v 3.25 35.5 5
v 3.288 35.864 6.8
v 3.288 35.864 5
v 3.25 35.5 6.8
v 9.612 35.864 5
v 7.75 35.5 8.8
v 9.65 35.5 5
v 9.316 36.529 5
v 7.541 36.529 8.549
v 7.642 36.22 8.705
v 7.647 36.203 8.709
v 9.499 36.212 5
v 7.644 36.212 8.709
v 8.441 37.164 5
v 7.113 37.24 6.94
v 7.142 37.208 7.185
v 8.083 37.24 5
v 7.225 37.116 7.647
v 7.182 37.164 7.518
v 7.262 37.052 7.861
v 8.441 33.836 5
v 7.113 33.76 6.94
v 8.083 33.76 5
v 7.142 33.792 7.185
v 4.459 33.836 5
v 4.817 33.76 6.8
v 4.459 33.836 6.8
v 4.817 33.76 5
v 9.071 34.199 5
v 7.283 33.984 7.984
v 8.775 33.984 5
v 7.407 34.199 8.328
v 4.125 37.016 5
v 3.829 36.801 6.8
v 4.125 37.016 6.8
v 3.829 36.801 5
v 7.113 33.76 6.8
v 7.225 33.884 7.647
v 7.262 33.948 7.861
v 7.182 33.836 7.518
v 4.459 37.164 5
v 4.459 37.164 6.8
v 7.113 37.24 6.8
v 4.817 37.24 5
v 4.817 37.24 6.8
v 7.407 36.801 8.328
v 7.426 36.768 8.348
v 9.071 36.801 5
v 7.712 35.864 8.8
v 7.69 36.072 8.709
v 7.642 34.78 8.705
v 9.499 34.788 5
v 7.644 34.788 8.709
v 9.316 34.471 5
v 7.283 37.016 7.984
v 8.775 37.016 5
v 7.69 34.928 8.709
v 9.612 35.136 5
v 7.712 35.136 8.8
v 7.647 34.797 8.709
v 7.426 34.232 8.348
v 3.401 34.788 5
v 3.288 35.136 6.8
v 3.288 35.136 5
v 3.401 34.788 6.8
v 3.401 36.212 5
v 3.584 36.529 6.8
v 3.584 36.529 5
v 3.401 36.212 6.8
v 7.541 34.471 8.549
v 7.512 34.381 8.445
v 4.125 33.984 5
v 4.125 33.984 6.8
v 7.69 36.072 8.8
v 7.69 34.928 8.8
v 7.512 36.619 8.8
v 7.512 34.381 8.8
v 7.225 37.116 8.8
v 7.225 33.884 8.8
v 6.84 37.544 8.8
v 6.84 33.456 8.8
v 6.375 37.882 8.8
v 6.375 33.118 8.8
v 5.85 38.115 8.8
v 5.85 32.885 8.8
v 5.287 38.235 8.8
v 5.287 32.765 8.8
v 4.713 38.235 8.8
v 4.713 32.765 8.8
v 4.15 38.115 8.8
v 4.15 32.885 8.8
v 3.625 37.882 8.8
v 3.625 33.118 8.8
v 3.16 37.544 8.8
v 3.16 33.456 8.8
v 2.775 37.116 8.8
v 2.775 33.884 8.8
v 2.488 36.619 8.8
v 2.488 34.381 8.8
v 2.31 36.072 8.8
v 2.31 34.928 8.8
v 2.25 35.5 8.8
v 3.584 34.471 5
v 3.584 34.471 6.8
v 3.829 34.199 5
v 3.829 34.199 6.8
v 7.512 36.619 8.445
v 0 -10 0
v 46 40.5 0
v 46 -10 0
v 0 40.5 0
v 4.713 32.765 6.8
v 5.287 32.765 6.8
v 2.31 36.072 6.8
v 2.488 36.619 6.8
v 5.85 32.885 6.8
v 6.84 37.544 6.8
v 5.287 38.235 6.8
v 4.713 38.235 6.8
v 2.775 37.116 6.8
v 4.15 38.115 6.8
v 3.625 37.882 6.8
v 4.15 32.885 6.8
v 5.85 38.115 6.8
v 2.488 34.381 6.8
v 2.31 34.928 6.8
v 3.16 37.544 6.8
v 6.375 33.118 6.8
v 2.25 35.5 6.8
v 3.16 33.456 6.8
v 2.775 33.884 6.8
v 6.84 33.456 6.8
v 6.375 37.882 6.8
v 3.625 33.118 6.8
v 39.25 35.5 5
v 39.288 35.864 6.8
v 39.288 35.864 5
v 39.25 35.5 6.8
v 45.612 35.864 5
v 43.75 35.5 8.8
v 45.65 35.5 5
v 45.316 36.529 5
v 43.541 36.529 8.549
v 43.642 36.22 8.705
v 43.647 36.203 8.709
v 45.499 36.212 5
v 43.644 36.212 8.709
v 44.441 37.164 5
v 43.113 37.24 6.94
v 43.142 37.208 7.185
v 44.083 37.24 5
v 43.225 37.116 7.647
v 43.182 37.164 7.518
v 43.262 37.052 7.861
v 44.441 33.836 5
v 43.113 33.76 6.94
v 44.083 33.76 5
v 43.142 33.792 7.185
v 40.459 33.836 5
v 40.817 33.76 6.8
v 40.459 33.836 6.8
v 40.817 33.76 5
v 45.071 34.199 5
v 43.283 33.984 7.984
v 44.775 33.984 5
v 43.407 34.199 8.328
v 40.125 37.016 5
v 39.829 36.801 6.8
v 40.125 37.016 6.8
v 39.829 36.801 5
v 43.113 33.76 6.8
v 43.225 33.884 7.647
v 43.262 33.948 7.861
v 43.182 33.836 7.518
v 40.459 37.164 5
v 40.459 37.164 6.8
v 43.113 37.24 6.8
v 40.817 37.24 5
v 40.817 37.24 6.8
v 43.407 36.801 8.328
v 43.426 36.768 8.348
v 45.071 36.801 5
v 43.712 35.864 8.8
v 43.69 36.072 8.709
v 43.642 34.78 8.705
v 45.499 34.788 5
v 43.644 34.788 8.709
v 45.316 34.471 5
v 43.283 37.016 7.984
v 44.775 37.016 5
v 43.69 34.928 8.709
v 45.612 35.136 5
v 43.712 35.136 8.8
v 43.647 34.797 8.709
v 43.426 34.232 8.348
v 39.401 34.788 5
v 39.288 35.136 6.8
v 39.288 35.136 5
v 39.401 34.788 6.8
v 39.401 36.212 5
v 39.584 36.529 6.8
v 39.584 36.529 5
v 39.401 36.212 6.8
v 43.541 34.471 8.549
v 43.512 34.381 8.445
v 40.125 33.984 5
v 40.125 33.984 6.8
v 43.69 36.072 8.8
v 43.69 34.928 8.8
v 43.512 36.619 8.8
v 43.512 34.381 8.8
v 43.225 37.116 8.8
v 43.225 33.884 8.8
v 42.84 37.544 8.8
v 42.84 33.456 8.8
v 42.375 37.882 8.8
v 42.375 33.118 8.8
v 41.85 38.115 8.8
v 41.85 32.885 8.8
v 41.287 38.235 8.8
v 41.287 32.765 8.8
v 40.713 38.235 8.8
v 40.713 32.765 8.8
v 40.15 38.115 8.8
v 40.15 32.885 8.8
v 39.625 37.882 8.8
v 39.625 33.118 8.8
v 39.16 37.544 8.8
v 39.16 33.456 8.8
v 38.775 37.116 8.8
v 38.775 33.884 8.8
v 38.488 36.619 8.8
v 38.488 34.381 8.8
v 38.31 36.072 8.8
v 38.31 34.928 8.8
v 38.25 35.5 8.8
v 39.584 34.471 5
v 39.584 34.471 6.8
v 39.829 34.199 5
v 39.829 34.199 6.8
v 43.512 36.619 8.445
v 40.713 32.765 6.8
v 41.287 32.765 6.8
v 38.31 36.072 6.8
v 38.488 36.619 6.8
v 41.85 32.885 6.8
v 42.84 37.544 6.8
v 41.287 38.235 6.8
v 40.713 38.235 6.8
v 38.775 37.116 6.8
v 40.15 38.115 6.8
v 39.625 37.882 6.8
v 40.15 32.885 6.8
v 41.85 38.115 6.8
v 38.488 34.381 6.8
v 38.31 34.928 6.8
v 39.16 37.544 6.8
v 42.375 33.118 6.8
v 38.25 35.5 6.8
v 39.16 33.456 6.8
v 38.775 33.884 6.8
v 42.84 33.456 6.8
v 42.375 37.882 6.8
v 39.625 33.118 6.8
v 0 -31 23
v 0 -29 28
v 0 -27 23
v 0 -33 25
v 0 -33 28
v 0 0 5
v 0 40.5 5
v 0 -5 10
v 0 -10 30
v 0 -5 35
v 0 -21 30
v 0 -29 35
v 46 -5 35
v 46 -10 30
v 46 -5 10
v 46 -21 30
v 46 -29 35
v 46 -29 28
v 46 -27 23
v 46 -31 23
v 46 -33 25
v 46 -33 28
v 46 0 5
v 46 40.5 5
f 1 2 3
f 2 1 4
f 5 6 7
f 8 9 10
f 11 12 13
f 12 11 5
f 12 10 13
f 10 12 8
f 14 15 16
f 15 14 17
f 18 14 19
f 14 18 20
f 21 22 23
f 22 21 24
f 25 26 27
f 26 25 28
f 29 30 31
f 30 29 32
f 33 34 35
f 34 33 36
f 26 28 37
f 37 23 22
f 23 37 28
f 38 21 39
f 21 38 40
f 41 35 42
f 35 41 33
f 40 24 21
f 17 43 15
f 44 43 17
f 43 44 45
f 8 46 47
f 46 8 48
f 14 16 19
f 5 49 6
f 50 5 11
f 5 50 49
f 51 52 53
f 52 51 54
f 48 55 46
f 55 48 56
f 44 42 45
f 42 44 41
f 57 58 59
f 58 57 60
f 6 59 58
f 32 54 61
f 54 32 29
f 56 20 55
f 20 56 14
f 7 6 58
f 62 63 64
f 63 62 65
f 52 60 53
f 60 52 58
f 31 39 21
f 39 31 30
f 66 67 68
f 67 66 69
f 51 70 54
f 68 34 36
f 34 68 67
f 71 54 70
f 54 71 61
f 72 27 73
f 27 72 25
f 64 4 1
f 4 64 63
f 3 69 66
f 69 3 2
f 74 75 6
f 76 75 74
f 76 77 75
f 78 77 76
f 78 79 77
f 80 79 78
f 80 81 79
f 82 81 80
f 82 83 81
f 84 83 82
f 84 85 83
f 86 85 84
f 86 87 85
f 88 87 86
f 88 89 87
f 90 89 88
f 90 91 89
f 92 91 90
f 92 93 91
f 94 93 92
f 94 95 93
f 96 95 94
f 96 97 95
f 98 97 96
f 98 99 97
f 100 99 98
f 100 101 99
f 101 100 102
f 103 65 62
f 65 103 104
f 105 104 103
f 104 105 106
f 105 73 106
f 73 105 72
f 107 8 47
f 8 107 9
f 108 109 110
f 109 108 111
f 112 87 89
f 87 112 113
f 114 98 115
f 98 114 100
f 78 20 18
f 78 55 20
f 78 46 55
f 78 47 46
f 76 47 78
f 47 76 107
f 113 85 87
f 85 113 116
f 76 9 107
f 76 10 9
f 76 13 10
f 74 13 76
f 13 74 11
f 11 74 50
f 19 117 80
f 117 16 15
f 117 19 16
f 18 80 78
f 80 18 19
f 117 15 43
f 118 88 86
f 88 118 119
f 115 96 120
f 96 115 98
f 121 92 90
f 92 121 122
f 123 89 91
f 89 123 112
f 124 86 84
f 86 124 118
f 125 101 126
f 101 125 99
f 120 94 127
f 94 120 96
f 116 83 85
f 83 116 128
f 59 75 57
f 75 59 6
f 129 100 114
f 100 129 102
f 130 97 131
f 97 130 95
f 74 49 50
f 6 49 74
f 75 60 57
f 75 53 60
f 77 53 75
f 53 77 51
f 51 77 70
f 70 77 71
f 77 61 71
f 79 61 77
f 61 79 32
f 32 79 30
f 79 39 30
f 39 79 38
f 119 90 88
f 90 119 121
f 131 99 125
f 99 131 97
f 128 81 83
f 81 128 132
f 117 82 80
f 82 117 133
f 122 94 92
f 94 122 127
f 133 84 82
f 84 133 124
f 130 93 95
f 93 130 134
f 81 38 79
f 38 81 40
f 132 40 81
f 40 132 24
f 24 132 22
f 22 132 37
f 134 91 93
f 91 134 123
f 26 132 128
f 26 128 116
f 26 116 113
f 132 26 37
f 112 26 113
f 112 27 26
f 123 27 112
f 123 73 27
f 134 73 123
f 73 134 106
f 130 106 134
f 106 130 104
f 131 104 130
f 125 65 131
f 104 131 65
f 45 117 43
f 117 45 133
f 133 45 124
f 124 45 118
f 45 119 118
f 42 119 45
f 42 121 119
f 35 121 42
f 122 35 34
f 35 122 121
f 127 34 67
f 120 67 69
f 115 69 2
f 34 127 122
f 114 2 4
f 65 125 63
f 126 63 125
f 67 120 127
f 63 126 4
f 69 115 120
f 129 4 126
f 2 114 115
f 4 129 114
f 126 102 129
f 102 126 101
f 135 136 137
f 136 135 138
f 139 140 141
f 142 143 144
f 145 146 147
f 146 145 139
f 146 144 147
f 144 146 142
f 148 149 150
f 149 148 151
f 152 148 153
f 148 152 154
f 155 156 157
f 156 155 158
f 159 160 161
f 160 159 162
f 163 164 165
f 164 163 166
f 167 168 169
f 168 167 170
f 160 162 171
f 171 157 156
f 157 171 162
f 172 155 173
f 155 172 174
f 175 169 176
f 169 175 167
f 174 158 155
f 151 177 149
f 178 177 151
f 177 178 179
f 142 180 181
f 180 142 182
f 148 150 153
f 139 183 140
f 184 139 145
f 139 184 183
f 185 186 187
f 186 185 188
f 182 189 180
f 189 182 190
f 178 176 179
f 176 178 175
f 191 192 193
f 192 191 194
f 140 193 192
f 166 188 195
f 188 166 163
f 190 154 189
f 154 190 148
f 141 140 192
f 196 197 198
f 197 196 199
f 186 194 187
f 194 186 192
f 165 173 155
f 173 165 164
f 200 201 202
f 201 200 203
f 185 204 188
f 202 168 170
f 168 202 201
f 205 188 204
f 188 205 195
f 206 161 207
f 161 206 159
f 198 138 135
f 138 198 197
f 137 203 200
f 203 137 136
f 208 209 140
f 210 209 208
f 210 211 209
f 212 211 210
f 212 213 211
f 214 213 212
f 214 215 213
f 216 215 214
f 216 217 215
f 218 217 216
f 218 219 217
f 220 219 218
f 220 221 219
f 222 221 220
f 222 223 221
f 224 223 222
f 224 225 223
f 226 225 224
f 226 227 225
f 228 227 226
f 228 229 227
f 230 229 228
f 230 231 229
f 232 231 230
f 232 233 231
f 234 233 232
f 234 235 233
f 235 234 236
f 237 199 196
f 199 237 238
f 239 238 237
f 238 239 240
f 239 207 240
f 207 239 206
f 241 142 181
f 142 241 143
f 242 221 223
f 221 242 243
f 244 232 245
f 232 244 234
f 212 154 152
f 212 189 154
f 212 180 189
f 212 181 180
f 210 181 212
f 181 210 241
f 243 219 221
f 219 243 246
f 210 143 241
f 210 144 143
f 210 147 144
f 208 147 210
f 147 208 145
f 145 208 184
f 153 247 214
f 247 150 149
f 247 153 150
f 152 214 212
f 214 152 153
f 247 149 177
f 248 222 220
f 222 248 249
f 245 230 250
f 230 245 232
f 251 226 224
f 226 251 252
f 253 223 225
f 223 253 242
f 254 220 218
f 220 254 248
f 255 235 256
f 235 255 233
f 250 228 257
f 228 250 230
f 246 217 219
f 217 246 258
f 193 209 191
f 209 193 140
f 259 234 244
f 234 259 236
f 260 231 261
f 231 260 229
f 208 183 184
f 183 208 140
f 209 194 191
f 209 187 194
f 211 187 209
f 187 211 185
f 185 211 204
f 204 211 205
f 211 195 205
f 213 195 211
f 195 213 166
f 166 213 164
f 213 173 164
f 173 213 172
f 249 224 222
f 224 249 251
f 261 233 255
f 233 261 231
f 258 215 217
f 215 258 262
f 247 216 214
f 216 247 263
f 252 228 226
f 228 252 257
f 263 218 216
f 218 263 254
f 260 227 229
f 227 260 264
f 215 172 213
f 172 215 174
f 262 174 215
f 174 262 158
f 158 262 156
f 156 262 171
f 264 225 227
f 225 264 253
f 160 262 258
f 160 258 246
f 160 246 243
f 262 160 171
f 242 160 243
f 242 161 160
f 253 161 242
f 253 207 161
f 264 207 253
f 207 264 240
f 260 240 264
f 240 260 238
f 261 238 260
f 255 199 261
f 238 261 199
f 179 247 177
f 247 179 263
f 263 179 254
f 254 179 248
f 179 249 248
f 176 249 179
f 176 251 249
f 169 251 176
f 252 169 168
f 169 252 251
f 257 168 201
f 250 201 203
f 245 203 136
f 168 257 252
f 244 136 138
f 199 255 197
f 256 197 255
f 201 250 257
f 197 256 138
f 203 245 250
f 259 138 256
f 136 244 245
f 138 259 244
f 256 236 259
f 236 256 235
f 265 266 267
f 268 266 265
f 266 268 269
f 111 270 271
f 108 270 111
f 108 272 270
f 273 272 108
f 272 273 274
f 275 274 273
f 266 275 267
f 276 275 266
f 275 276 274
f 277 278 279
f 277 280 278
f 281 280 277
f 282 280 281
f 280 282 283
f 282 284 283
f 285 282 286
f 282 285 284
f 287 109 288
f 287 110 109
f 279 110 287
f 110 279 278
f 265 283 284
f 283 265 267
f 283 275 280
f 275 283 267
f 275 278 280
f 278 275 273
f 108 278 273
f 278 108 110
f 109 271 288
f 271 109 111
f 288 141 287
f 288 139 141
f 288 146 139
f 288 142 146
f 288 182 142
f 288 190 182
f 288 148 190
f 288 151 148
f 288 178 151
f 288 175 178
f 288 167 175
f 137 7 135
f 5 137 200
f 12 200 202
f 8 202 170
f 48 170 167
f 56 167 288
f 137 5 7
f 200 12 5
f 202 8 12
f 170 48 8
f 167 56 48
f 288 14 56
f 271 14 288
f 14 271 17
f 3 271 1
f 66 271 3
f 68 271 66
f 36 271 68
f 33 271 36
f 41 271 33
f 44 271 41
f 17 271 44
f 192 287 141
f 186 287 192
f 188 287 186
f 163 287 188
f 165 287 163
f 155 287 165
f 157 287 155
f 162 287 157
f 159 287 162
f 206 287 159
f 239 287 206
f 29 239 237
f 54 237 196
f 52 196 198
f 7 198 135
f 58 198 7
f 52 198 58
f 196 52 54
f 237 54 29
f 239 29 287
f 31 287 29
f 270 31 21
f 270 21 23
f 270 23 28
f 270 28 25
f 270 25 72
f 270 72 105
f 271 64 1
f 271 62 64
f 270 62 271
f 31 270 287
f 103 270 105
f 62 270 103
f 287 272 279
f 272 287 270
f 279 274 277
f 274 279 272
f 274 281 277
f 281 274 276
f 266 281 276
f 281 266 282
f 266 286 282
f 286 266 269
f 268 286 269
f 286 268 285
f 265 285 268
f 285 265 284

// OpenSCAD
$fs = 0.1;
mm = 1;

///////////////////////////////////////
// Measurements from the CanaKit case.

// Larger diameter of the keyhole opening.
keyhole_real_dia = 6.5 * mm;

// Smaller diameter of the keyhole opening
keyhole_inner_dia = 3.5 * mm;

// Distance between the keyhole and
// the SD card / HDMI edges.
keyhole_start_position = [ 29.5, 35.5, 0 ];

// Spacing between the two keyholes.
keyhole_pitch = [ 36, 0, 0 ] * mm;

keyhole_positions = [for (i = [0:1]) keyhole_start_position + i * keyhole_pitch];

// How far the keyhole goes into the case.
keyhole_depth = 3.8 * mm;

// How much (depth) clearance there is for the head of the mountpoint.
keyhole_head_height = 2 * mm;

// Adjusted dimensions (adding some slack) for the printed heads.
keyhole_dia = keyhole_real_dia - 1 * mm;

///////////////////////////////////////
// 30x30 extrusion dimensions

extrusion_width = 30 * mm;
extrusion_slot_opening_width = 8 * mm;
extrusion_slot_depth = 9 * mm;
extrusion_slot_lip_thickness = 2 * mm;
extrusion_slot_inner_width = 16 * mm;
extrusion_diagonal_thickness = 2.54 * mm;

// How far in (on each edge: bottom/side) the diagonal starts on the inside of
// the slot.
//
// Put another way: Imagine if you extend the bottom and side of the slot to
// meet at a single point at a right angle. The diagonal edge of the slot then
// makes a 45-45-90 triangle with those two edges, and this is the side length
// of those edges of the triangle (except the diagonal).
//
// Datasheets that I've seen specify the diagonal parts in terms of its
// thickness, so I had to do some geometry to come up with a formula for this.
// extrusion_slot_diagonal_inset = extrusion_slot_inner_width / 2 - (extrusion_width / 2 - extrusion_slot_depth) +
//                                extrusion_diagonal_thickness / 2 * sqrt(2);
extrusion_slot_diagonal_inset = 4 * mm;

///////////////////////////////////////
// Part parameters

// Width of the structural elements.
bracket_width = 10 * mm;

// Thickness of the structural elements.
bracket_thickness = 5 * mm;

// How much clearance should there be between the bracket edge and the Pi?
bracket_offset = 5 * mm;

module keyhole()
{
    // Stem, using a convex hull to create a ramp on the bottom side.
    // This will reduce the overhang of the keyhole head to an acceptable level.
    hull()
    {
        cylinder(d = keyhole_inner_dia, h = keyhole_depth + bracket_thickness);
        translate([ (keyhole_dia - keyhole_inner_dia) / 2, 0, 0 ])
            cylinder(d = keyhole_inner_dia, h = keyhole_depth + bracket_thickness);
        translate([ (keyhole_dia - keyhole_inner_dia + keyhole_depth) / 2, 0, 0 ])
            cylinder(d = keyhole_inner_dia, h = bracket_thickness);
    }

    // Head
    translate([ 0, 0, keyhole_depth + bracket_thickness - keyhole_head_height ]) hull()
    {
        cylinder(d = keyhole_dia, h = keyhole_head_height);
    }
}

module extrusion_profile()
{
    polygon([
        [ -extrusion_width / 2, -extrusion_width / 2 ],
        [ -extrusion_width / 2, extrusion_width / 2 ],
        [ -extrusion_slot_opening_width / 2, extrusion_width / 2 ],
        [ -extrusion_slot_opening_width / 2, extrusion_width / 2 - extrusion_slot_lip_thickness ],
        [ -extrusion_slot_inner_width / 2, extrusion_width / 2 - extrusion_slot_lip_thickness ],
        [ -extrusion_slot_inner_width / 2, extrusion_width / 2 - extrusion_slot_depth + extrusion_slot_diagonal_inset ],
        [ -extrusion_slot_inner_width / 2 + extrusion_slot_diagonal_inset, extrusion_width / 2 - extrusion_slot_depth ],
        [ extrusion_slot_inner_width / 2 - extrusion_slot_diagonal_inset, extrusion_width / 2 - extrusion_slot_depth ],
        [ extrusion_slot_inner_width / 2, extrusion_width / 2 - extrusion_slot_depth + extrusion_slot_diagonal_inset ],
        [ extrusion_slot_inner_width / 2, extrusion_width / 2 - extrusion_slot_lip_thickness ],
        [ extrusion_slot_opening_width / 2, extrusion_width / 2 - extrusion_slot_lip_thickness ],
        [ extrusion_slot_opening_width / 2, extrusion_width / 2 ],
        [ extrusion_width / 2, extrusion_width / 2 ],
        [ extrusion_width / 2, -extrusion_width / 2 ],
    ]);
}

module bracket_profile()
{
    polygon([
        [ 0, -bracket_offset - bracket_thickness ],
        [ 0, keyhole_start_position[1] + bracket_width / 2 ],
        [ -bracket_thickness, keyhole_start_position[1] + bracket_width / 2 ],
        [ -bracket_thickness, 0 ],
        [ -bracket_thickness - bracket_offset, -bracket_offset ],
        [ -extrusion_width - bracket_thickness, -bracket_offset ],
        [
            -extrusion_width - bracket_thickness,
            -bracket_offset - bracket_thickness - (extrusion_width - extrusion_slot_opening_width) / 2
        ],
        [
            -extrusion_width - bracket_thickness,
            -bracket_offset - bracket_thickness - (extrusion_width + extrusion_slot_opening_width) / 2
        ],
        [
            -extrusion_width + extrusion_slot_lip_thickness,
            -bracket_offset - bracket_thickness - (extrusion_width + extrusion_slot_opening_width) / 2
        ],
        [
            -extrusion_width + extrusion_slot_lip_thickness,
            -bracket_offset - bracket_thickness - (extrusion_width + extrusion_slot_inner_width) / 2
        ],
        [
            -extrusion_width + extrusion_slot_depth - extrusion_slot_diagonal_inset,
            -bracket_offset - bracket_thickness - (extrusion_width + extrusion_slot_inner_width) / 2
        ],
        [
            -extrusion_width + extrusion_slot_depth - extrusion_slot_diagonal_inset + 2 * mm,
            -bracket_offset - bracket_thickness - (extrusion_width + extrusion_slot_inner_width) / 2 + 2 *
            mm
        ],
        [
            -extrusion_width + extrusion_slot_depth - extrusion_slot_diagonal_inset + 2 * mm,
            -bracket_offset - bracket_thickness - extrusion_width / 2 - 2 *
            mm
        ],
        [
            -extrusion_width, -bracket_offset - bracket_thickness - (extrusion_width - extrusion_slot_opening_width) / 2
        ],
        [ -extrusion_width, -bracket_offset - bracket_thickness ],
    ]);
}

module prusa_rpi1b_mount()
{
    rotate([ 0, 90, 0 ]) linear_extrude(height = keyhole_pitch[0] + bracket_width) bracket_profile();
    translate([ bracket_width / 2, keyhole_start_position[1], 0 ]) keyhole();
    translate([ bracket_width / 2 + keyhole_pitch[0], keyhole_start_position[1], 0 ]) keyhole();
}

prusa_rpi1b_mount();

translate([ -2, -bracket_offset - bracket_thickness - extrusion_width / 2, extrusion_width / 2 ]) rotate([ 90, 0, 90 ])
    extrusion_profile();
